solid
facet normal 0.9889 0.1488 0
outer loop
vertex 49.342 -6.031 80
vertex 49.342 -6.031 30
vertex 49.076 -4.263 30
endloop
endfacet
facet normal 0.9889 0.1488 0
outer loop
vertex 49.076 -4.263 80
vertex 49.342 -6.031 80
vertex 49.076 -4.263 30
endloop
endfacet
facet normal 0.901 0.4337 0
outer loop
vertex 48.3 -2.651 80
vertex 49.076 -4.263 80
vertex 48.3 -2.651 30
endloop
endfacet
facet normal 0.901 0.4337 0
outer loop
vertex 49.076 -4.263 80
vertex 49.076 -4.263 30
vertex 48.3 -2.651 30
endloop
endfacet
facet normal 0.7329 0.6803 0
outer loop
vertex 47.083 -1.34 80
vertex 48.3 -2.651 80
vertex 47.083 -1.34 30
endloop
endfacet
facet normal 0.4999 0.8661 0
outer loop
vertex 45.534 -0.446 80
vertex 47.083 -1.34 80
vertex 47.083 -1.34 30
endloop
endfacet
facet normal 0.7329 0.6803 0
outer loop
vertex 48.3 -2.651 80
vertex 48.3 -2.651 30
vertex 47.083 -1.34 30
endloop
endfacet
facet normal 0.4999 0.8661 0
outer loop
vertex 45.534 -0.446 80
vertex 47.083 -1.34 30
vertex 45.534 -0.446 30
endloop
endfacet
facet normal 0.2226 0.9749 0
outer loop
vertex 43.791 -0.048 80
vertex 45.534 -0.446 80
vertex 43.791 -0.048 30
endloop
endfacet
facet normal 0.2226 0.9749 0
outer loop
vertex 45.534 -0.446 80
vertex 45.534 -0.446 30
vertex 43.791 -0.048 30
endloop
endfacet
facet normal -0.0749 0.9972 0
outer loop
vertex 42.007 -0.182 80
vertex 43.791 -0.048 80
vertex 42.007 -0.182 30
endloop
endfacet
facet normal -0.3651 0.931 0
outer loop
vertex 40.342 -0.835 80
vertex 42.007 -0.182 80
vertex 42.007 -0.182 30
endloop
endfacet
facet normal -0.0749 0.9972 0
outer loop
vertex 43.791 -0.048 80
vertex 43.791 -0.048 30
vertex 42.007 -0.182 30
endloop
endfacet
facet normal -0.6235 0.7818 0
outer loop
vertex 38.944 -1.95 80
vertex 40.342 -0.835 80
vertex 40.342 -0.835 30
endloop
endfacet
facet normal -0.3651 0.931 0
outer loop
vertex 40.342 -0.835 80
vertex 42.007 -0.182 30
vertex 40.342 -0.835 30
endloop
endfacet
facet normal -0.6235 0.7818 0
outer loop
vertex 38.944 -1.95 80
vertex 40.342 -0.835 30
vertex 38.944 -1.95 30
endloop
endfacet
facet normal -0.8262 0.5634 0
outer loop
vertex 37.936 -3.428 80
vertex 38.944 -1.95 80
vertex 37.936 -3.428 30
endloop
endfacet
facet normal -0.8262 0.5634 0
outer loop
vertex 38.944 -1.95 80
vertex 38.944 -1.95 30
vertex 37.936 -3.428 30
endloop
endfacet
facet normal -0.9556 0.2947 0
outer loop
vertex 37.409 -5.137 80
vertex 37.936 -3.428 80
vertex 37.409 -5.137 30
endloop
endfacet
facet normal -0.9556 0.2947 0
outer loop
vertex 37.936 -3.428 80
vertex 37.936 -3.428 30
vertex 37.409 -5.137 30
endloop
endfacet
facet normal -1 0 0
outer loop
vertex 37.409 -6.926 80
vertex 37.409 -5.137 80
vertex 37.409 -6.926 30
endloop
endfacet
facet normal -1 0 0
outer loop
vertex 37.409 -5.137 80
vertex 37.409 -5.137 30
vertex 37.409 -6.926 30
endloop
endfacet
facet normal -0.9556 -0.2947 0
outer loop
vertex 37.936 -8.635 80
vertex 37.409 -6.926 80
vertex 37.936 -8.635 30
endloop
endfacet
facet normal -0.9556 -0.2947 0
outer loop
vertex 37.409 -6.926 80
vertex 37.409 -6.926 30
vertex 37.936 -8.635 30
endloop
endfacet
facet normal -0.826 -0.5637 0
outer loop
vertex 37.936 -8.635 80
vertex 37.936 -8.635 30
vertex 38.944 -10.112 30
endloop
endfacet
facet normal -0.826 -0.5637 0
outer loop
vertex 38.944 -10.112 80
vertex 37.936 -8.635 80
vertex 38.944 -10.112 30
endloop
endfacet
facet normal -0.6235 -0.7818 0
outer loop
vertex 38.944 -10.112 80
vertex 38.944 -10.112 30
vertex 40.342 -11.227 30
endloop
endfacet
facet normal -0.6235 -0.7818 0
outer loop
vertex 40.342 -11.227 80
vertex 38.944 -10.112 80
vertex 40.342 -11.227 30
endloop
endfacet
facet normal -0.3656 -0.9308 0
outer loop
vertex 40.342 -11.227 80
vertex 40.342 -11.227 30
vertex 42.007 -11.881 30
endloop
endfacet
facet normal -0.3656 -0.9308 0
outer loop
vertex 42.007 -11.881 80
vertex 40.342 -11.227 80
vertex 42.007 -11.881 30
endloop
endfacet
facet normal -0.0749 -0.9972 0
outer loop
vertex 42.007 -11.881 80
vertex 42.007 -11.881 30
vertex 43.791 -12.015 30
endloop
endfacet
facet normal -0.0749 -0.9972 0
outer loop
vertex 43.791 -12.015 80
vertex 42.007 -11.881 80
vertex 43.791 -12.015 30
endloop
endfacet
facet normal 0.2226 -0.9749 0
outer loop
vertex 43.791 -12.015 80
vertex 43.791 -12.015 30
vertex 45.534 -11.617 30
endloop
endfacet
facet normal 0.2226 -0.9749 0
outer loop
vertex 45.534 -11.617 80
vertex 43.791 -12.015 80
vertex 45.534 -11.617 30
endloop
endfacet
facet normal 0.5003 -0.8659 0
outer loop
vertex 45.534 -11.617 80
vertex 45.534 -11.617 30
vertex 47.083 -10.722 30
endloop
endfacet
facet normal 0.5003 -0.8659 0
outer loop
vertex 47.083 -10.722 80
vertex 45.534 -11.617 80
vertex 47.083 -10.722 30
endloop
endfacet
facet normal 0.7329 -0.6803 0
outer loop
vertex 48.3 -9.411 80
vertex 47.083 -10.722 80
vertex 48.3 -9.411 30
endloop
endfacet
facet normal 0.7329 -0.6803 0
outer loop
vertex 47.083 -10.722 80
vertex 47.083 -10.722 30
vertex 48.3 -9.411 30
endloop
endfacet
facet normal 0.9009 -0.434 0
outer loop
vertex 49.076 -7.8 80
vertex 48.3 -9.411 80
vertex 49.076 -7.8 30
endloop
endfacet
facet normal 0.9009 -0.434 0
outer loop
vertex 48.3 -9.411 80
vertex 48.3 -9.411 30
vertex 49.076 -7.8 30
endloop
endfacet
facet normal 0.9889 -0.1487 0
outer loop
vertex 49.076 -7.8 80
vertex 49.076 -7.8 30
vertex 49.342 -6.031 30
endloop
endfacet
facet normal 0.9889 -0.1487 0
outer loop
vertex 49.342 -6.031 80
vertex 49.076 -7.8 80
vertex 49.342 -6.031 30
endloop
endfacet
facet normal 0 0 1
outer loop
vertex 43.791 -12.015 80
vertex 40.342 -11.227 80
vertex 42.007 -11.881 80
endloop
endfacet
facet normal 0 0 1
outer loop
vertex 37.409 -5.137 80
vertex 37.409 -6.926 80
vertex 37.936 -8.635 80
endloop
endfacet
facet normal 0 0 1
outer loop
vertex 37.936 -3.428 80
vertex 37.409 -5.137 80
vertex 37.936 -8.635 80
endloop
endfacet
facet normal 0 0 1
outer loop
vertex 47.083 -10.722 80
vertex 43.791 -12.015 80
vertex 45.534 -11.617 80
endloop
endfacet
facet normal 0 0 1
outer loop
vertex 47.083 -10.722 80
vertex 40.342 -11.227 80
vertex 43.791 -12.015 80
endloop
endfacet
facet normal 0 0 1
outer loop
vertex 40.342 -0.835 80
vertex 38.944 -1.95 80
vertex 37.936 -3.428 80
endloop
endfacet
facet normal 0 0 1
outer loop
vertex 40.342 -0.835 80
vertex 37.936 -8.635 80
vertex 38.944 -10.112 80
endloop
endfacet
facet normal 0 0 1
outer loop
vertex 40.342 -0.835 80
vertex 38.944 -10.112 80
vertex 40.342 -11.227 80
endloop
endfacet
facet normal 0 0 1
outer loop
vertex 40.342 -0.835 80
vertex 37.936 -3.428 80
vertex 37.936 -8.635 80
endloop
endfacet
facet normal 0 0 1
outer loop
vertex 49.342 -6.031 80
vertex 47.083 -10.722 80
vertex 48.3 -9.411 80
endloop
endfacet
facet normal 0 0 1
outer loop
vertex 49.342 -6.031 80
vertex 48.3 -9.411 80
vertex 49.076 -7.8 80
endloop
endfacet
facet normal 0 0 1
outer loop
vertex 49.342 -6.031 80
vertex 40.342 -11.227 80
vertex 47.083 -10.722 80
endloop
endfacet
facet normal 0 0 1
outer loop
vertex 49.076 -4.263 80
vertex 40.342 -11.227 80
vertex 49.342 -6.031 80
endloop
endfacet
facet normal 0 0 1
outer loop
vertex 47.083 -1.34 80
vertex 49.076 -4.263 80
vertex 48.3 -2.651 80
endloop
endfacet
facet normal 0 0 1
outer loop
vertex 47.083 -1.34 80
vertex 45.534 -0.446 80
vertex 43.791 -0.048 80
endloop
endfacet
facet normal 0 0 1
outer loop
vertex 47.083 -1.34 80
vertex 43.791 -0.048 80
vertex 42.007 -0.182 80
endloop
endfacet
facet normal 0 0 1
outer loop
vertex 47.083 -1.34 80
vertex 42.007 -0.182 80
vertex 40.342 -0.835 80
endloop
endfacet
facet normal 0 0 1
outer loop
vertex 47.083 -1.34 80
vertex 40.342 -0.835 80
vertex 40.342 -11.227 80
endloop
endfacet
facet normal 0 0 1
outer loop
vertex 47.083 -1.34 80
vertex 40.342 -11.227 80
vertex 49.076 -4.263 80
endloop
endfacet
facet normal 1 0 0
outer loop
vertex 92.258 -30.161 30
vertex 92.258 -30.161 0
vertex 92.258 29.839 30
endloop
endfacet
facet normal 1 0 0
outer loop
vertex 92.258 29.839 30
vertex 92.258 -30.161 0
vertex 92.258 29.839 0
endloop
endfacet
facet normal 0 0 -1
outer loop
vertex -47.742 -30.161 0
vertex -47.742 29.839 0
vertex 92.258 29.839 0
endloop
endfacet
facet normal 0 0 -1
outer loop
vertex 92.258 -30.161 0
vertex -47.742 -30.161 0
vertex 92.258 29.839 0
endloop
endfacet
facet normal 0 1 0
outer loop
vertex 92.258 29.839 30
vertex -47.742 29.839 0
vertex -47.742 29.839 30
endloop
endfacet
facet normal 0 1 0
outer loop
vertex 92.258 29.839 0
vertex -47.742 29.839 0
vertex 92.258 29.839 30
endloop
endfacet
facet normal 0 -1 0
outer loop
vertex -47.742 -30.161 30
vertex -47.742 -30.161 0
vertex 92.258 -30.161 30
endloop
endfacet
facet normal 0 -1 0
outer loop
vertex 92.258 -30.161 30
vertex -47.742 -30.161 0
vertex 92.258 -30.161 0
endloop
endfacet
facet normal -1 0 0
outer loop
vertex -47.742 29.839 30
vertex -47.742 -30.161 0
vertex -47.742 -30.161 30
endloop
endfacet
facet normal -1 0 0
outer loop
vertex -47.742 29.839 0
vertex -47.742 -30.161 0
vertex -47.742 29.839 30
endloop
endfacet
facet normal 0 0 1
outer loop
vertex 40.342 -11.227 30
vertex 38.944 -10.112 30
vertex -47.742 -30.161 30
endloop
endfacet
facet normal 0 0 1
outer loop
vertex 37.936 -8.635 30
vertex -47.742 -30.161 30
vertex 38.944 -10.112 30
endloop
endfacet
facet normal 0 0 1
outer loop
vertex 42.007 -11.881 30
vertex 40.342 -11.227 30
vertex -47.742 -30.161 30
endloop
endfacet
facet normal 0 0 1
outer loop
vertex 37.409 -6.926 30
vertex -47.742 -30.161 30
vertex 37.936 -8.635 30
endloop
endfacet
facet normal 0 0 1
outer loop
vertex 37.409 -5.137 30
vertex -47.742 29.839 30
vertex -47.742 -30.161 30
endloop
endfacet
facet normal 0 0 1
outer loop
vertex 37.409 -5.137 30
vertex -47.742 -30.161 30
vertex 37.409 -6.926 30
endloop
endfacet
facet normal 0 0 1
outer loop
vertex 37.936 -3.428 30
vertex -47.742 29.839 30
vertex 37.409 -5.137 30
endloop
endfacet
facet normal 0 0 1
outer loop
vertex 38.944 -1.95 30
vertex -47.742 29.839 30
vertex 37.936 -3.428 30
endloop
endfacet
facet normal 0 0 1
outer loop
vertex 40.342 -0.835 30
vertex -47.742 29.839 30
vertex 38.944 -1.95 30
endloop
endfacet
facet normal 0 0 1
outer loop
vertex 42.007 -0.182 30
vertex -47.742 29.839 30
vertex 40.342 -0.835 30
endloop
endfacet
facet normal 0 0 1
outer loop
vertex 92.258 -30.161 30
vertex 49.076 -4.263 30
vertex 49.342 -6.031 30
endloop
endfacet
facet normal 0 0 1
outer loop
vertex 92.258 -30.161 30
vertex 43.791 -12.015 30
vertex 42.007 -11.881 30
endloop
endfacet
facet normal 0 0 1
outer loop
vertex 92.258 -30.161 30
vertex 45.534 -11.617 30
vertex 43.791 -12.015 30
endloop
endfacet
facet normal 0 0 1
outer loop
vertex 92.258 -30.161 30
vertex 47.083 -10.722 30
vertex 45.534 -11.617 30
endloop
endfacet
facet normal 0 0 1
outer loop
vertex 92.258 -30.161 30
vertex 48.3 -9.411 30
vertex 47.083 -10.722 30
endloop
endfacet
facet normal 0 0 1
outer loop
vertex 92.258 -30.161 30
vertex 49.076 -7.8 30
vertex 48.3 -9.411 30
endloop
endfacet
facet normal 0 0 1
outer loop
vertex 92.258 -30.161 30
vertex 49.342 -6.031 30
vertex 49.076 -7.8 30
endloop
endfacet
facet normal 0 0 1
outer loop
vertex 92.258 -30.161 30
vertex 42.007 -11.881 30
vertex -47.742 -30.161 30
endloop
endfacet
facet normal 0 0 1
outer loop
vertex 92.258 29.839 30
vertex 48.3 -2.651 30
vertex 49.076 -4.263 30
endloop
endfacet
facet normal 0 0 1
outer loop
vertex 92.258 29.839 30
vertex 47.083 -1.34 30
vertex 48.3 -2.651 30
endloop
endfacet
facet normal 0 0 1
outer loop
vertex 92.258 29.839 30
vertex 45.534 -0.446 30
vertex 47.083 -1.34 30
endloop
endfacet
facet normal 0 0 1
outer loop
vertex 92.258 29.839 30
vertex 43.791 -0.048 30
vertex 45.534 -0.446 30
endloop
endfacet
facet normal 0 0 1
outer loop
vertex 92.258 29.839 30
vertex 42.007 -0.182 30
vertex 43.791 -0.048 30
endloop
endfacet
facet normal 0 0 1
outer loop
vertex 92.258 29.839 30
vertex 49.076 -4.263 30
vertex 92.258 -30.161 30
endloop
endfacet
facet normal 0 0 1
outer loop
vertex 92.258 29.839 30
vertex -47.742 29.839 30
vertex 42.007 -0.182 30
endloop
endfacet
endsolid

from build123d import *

# Parameters (mm, degrees)
IZIM2_W                     = 140
IZIM2_H                     = 60
Y_KSEKLIK_EKSTR_ZYON2_DEPTH = 30
IZIM3_R                     = 6
Y_KSEKLIK_EKSTR_ZYON3_DEPTH = 50


with BuildPart() as part:
    # Çizim2 → Yükseklik-Ekstrüzyon2 (new body)
    with BuildSketch(Plane.XY):
        with Locations((22.258064516, -0.161290323)):
            Rectangle(IZIM2_W, IZIM2_H)
    extrude(amount=Y_KSEKLIK_EKSTR_ZYON2_DEPTH)

    # Çizim3 → Yükseklik-Ekstrüzyon3 (add)
    with BuildSketch(Plane.XY.offset(30)):
        with Locations((43.342230404, -6.03131378)):
            Circle(IZIM3_R)
    extrude(amount=Y_KSEKLIK_EKSTR_ZYON3_DEPTH)


solid = part.part
